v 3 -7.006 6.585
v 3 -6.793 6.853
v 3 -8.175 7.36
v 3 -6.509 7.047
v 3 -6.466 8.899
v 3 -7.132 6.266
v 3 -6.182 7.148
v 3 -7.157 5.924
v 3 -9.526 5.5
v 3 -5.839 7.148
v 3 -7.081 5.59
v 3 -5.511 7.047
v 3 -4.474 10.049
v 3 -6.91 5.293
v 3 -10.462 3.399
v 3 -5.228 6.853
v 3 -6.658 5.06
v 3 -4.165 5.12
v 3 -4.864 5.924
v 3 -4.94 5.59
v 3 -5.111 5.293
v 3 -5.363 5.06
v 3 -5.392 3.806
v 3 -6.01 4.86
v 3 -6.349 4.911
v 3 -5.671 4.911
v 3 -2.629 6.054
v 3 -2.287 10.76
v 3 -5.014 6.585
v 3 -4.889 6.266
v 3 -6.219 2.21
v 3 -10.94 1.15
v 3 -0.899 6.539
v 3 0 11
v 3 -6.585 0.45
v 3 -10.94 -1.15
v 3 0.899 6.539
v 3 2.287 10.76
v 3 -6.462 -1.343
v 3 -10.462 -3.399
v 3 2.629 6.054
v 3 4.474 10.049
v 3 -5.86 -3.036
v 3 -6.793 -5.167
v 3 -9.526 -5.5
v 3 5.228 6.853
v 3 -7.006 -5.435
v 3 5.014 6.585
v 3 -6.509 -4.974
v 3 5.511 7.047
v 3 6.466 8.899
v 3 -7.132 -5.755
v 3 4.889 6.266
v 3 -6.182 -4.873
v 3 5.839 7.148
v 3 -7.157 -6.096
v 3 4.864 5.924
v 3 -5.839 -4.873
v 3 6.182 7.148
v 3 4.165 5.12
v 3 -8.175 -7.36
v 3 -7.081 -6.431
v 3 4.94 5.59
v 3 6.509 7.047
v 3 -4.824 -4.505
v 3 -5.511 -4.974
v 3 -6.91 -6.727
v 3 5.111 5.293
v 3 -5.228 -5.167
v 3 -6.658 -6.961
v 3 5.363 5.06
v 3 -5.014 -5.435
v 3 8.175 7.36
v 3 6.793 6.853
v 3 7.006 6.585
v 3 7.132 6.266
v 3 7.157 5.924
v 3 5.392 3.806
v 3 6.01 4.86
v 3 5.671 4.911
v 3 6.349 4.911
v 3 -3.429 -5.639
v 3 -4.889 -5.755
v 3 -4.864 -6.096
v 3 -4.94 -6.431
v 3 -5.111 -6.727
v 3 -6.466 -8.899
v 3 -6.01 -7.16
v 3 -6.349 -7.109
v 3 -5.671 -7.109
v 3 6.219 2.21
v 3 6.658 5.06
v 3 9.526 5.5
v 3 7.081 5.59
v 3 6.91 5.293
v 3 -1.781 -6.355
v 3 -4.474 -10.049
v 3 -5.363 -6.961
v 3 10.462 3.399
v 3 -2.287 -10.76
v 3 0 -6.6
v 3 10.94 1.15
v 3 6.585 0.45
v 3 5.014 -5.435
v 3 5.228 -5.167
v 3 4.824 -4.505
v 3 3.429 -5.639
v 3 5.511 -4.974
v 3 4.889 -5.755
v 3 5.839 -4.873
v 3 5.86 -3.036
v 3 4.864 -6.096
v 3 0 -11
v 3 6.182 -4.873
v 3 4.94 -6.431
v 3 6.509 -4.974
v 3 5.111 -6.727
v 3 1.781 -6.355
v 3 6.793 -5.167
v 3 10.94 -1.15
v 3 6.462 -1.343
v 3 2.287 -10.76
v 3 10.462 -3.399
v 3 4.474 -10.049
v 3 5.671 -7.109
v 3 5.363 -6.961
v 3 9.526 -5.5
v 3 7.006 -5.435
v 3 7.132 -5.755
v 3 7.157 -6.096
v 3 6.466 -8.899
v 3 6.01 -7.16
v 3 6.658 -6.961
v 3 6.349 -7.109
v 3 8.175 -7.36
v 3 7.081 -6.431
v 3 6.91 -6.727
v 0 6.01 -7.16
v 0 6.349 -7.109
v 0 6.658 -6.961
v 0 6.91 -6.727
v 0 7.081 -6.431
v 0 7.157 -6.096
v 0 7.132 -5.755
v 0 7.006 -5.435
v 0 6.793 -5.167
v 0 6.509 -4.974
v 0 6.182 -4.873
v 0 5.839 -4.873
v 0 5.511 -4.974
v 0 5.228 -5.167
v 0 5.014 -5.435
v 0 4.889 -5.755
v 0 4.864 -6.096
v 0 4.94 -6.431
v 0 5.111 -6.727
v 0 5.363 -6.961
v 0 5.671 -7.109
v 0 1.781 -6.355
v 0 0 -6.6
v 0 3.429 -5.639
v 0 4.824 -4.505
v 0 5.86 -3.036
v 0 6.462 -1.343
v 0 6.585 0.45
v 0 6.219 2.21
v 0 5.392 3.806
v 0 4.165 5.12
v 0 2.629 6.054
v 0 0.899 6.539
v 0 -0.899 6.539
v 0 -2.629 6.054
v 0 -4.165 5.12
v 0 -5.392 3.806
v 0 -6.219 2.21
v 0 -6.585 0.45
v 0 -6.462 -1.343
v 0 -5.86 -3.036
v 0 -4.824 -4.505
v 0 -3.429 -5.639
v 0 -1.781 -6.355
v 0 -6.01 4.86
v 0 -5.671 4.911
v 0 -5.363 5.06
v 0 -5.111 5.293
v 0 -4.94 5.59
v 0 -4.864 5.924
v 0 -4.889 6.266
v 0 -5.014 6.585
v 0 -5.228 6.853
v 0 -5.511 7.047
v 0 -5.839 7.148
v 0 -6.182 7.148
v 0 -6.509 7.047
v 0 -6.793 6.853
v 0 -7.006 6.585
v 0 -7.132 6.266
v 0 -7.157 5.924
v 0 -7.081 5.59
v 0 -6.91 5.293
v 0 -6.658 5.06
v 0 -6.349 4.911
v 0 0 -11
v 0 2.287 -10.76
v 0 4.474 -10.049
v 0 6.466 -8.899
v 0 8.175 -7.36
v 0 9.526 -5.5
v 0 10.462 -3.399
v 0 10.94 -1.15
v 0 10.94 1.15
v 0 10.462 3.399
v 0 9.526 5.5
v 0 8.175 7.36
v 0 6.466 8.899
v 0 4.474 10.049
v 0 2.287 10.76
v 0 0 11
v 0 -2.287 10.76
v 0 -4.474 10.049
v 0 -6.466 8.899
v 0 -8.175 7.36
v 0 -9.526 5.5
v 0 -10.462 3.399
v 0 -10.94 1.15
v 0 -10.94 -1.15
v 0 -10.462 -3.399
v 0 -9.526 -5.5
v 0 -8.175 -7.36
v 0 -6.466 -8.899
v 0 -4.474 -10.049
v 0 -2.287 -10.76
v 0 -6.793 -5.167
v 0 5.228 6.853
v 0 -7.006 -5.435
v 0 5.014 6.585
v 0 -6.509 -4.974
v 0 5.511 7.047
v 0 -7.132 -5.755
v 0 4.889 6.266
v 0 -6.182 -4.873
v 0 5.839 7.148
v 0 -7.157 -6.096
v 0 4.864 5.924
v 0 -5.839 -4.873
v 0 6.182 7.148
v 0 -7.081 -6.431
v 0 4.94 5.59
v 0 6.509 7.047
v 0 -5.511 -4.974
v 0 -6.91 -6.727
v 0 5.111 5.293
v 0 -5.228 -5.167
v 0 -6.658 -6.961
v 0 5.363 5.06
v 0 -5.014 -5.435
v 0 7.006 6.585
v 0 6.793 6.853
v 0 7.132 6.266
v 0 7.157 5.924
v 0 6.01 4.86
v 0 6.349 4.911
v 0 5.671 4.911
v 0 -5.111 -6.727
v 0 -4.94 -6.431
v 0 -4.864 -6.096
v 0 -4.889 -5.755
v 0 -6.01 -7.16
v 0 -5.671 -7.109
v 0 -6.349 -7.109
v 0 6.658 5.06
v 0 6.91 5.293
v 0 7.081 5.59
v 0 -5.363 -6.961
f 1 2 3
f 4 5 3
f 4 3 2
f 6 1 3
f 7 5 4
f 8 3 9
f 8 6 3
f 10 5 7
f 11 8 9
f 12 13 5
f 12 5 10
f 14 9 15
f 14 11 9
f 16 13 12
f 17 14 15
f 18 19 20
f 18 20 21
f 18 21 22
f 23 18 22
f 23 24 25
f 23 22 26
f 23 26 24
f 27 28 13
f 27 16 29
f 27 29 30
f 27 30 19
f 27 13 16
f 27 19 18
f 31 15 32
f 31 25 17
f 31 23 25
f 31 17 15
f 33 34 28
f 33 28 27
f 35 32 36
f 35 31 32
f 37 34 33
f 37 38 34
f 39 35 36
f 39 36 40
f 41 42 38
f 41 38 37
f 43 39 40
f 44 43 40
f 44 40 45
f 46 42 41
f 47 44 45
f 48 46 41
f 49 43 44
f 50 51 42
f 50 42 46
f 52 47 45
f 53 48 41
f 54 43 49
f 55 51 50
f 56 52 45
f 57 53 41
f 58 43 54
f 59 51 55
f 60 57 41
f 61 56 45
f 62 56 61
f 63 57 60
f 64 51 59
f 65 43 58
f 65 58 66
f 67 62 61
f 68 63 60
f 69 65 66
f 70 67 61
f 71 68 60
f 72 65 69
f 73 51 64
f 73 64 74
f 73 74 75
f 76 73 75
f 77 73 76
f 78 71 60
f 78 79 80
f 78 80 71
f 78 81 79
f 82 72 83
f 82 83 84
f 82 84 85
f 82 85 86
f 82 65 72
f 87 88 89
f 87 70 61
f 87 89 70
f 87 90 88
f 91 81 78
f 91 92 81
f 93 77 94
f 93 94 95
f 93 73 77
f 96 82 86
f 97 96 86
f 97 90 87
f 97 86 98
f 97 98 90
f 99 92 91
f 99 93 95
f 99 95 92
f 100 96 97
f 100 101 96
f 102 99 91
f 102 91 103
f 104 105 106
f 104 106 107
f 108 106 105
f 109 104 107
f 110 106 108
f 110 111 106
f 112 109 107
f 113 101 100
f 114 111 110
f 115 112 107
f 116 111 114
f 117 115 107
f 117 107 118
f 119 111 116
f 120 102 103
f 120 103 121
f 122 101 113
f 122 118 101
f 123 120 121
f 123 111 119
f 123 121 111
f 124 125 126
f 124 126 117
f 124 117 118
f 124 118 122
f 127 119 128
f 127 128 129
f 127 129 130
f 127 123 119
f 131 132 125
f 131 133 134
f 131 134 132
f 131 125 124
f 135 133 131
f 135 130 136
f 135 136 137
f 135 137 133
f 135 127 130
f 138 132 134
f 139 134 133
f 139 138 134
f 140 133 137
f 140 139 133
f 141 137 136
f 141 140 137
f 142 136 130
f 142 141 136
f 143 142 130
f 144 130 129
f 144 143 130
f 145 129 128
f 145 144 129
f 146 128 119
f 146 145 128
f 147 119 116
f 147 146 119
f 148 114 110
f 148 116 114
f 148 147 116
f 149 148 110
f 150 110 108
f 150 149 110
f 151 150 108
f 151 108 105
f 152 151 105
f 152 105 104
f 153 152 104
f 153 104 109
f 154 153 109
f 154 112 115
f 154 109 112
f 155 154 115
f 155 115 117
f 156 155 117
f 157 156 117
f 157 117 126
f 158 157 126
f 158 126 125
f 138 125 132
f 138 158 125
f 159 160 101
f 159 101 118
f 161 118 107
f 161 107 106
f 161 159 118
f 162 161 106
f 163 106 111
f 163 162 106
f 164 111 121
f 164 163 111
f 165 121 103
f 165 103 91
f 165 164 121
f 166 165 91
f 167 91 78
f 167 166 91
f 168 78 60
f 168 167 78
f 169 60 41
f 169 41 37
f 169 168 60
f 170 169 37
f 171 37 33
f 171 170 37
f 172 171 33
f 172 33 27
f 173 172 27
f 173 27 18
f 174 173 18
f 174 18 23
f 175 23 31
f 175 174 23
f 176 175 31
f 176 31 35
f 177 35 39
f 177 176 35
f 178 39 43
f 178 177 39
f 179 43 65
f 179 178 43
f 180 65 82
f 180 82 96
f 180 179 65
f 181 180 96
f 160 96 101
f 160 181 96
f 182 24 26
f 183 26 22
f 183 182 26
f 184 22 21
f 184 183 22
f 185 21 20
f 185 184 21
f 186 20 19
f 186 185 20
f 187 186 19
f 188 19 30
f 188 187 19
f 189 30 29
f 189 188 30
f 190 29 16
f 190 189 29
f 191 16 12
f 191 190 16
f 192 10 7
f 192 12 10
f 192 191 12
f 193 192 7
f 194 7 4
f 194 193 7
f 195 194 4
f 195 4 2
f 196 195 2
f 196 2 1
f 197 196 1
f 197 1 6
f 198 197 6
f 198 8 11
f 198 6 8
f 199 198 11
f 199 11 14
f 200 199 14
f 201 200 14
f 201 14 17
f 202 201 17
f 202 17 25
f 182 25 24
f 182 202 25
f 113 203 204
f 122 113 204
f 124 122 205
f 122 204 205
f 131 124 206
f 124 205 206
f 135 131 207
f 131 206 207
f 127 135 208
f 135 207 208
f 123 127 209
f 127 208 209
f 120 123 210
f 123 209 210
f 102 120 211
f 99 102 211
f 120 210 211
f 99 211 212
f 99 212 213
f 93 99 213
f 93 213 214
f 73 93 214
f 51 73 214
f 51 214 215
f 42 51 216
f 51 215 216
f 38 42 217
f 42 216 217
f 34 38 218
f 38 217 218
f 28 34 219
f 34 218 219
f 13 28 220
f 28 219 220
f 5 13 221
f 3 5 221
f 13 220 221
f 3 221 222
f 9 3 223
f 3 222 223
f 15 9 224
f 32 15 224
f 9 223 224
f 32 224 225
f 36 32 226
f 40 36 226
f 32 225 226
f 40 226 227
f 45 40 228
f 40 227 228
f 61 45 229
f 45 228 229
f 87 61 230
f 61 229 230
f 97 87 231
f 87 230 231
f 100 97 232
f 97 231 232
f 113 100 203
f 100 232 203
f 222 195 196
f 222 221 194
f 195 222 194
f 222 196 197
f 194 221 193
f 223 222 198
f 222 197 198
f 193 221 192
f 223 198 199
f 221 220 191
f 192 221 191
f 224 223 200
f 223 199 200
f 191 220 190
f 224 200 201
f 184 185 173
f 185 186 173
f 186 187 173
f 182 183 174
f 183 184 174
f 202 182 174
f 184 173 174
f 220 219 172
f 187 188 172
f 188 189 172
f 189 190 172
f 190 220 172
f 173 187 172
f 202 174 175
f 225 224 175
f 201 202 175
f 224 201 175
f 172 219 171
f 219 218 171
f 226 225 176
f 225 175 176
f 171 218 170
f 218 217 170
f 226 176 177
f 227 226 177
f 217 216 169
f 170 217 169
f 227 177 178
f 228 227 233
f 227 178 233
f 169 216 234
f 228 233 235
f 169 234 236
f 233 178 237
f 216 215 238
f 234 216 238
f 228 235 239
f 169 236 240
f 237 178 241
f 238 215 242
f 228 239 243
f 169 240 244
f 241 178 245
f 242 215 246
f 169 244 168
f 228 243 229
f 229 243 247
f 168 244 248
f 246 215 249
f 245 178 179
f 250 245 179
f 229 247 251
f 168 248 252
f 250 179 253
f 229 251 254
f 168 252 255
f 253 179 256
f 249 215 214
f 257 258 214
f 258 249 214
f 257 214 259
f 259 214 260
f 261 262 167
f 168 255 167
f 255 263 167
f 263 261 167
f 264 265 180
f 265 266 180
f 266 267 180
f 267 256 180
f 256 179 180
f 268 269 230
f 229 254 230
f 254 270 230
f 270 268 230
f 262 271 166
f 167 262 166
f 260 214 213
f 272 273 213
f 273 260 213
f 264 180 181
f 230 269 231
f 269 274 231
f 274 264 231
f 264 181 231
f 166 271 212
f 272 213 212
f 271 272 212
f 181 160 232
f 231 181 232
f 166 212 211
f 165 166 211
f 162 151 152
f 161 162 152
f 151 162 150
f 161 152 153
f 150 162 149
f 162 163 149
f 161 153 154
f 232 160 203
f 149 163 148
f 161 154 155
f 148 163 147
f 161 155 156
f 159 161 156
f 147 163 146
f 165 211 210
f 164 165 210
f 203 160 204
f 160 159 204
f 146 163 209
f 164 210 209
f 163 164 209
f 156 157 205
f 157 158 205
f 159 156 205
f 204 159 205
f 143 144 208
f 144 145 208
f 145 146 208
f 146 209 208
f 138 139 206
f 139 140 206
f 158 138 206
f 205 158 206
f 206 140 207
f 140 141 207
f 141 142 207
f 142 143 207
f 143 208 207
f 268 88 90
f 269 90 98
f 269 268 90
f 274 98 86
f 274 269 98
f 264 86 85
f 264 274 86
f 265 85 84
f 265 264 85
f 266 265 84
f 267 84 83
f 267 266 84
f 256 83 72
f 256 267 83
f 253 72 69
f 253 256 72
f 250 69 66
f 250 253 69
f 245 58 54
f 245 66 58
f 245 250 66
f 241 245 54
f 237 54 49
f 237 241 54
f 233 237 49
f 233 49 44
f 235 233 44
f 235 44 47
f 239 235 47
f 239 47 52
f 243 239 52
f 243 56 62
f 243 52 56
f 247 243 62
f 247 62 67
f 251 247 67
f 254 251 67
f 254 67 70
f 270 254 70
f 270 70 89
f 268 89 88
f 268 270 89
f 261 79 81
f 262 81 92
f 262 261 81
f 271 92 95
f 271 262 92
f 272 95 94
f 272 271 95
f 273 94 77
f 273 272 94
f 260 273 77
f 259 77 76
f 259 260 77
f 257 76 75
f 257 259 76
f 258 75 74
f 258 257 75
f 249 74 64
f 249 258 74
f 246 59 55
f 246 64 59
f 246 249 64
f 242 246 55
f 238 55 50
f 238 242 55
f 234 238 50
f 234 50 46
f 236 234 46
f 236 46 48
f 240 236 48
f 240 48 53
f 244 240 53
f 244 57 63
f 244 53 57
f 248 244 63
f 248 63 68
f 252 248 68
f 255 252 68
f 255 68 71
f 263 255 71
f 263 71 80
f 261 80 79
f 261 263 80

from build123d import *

# Parameters (mm, degrees)
SKETCH2_R           = 11
SKETCH2_R_2         = 6.6
BOSS_EXTRUDE1_DEPTH = 3
SKETCH3_R           = 1.15
CUT_EXTRUDE1_DEPTH  = 4


with BuildPart() as part:
    # Sketch2 → Boss-Extrude1 (new body)
    with BuildSketch(Plane(origin=(0, 0, 0), x_dir=(0, 0, -1), z_dir=(1, 0, 0))):
        Circle(SKETCH2_R)
        Circle(SKETCH2_R_2, mode=Mode.SUBTRACT)
    extrude(amount=BOSS_EXTRUDE1_DEPTH)

    # Sketch3 → Cut-Extrude1 (cut, through all)
    with BuildSketch(Plane(origin=(0, 0, 0), x_dir=(0, 0, -1), z_dir=(1, 0, 0))):
        with Locations((6.01040764, 6.01040764)):
            Circle(SKETCH3_R)
        with Locations((6.01040764, -6.01040764)):
            Circle(SKETCH3_R)
        with Locations((-6.01040764, -6.01040764)):
            Circle(SKETCH3_R)
        with Locations((-6.01040764, 6.01040764)):
            Circle(SKETCH3_R)
    extrude(amount=CUT_EXTRUDE1_DEPTH, mode=Mode.SUBTRACT)


solid = part.part
